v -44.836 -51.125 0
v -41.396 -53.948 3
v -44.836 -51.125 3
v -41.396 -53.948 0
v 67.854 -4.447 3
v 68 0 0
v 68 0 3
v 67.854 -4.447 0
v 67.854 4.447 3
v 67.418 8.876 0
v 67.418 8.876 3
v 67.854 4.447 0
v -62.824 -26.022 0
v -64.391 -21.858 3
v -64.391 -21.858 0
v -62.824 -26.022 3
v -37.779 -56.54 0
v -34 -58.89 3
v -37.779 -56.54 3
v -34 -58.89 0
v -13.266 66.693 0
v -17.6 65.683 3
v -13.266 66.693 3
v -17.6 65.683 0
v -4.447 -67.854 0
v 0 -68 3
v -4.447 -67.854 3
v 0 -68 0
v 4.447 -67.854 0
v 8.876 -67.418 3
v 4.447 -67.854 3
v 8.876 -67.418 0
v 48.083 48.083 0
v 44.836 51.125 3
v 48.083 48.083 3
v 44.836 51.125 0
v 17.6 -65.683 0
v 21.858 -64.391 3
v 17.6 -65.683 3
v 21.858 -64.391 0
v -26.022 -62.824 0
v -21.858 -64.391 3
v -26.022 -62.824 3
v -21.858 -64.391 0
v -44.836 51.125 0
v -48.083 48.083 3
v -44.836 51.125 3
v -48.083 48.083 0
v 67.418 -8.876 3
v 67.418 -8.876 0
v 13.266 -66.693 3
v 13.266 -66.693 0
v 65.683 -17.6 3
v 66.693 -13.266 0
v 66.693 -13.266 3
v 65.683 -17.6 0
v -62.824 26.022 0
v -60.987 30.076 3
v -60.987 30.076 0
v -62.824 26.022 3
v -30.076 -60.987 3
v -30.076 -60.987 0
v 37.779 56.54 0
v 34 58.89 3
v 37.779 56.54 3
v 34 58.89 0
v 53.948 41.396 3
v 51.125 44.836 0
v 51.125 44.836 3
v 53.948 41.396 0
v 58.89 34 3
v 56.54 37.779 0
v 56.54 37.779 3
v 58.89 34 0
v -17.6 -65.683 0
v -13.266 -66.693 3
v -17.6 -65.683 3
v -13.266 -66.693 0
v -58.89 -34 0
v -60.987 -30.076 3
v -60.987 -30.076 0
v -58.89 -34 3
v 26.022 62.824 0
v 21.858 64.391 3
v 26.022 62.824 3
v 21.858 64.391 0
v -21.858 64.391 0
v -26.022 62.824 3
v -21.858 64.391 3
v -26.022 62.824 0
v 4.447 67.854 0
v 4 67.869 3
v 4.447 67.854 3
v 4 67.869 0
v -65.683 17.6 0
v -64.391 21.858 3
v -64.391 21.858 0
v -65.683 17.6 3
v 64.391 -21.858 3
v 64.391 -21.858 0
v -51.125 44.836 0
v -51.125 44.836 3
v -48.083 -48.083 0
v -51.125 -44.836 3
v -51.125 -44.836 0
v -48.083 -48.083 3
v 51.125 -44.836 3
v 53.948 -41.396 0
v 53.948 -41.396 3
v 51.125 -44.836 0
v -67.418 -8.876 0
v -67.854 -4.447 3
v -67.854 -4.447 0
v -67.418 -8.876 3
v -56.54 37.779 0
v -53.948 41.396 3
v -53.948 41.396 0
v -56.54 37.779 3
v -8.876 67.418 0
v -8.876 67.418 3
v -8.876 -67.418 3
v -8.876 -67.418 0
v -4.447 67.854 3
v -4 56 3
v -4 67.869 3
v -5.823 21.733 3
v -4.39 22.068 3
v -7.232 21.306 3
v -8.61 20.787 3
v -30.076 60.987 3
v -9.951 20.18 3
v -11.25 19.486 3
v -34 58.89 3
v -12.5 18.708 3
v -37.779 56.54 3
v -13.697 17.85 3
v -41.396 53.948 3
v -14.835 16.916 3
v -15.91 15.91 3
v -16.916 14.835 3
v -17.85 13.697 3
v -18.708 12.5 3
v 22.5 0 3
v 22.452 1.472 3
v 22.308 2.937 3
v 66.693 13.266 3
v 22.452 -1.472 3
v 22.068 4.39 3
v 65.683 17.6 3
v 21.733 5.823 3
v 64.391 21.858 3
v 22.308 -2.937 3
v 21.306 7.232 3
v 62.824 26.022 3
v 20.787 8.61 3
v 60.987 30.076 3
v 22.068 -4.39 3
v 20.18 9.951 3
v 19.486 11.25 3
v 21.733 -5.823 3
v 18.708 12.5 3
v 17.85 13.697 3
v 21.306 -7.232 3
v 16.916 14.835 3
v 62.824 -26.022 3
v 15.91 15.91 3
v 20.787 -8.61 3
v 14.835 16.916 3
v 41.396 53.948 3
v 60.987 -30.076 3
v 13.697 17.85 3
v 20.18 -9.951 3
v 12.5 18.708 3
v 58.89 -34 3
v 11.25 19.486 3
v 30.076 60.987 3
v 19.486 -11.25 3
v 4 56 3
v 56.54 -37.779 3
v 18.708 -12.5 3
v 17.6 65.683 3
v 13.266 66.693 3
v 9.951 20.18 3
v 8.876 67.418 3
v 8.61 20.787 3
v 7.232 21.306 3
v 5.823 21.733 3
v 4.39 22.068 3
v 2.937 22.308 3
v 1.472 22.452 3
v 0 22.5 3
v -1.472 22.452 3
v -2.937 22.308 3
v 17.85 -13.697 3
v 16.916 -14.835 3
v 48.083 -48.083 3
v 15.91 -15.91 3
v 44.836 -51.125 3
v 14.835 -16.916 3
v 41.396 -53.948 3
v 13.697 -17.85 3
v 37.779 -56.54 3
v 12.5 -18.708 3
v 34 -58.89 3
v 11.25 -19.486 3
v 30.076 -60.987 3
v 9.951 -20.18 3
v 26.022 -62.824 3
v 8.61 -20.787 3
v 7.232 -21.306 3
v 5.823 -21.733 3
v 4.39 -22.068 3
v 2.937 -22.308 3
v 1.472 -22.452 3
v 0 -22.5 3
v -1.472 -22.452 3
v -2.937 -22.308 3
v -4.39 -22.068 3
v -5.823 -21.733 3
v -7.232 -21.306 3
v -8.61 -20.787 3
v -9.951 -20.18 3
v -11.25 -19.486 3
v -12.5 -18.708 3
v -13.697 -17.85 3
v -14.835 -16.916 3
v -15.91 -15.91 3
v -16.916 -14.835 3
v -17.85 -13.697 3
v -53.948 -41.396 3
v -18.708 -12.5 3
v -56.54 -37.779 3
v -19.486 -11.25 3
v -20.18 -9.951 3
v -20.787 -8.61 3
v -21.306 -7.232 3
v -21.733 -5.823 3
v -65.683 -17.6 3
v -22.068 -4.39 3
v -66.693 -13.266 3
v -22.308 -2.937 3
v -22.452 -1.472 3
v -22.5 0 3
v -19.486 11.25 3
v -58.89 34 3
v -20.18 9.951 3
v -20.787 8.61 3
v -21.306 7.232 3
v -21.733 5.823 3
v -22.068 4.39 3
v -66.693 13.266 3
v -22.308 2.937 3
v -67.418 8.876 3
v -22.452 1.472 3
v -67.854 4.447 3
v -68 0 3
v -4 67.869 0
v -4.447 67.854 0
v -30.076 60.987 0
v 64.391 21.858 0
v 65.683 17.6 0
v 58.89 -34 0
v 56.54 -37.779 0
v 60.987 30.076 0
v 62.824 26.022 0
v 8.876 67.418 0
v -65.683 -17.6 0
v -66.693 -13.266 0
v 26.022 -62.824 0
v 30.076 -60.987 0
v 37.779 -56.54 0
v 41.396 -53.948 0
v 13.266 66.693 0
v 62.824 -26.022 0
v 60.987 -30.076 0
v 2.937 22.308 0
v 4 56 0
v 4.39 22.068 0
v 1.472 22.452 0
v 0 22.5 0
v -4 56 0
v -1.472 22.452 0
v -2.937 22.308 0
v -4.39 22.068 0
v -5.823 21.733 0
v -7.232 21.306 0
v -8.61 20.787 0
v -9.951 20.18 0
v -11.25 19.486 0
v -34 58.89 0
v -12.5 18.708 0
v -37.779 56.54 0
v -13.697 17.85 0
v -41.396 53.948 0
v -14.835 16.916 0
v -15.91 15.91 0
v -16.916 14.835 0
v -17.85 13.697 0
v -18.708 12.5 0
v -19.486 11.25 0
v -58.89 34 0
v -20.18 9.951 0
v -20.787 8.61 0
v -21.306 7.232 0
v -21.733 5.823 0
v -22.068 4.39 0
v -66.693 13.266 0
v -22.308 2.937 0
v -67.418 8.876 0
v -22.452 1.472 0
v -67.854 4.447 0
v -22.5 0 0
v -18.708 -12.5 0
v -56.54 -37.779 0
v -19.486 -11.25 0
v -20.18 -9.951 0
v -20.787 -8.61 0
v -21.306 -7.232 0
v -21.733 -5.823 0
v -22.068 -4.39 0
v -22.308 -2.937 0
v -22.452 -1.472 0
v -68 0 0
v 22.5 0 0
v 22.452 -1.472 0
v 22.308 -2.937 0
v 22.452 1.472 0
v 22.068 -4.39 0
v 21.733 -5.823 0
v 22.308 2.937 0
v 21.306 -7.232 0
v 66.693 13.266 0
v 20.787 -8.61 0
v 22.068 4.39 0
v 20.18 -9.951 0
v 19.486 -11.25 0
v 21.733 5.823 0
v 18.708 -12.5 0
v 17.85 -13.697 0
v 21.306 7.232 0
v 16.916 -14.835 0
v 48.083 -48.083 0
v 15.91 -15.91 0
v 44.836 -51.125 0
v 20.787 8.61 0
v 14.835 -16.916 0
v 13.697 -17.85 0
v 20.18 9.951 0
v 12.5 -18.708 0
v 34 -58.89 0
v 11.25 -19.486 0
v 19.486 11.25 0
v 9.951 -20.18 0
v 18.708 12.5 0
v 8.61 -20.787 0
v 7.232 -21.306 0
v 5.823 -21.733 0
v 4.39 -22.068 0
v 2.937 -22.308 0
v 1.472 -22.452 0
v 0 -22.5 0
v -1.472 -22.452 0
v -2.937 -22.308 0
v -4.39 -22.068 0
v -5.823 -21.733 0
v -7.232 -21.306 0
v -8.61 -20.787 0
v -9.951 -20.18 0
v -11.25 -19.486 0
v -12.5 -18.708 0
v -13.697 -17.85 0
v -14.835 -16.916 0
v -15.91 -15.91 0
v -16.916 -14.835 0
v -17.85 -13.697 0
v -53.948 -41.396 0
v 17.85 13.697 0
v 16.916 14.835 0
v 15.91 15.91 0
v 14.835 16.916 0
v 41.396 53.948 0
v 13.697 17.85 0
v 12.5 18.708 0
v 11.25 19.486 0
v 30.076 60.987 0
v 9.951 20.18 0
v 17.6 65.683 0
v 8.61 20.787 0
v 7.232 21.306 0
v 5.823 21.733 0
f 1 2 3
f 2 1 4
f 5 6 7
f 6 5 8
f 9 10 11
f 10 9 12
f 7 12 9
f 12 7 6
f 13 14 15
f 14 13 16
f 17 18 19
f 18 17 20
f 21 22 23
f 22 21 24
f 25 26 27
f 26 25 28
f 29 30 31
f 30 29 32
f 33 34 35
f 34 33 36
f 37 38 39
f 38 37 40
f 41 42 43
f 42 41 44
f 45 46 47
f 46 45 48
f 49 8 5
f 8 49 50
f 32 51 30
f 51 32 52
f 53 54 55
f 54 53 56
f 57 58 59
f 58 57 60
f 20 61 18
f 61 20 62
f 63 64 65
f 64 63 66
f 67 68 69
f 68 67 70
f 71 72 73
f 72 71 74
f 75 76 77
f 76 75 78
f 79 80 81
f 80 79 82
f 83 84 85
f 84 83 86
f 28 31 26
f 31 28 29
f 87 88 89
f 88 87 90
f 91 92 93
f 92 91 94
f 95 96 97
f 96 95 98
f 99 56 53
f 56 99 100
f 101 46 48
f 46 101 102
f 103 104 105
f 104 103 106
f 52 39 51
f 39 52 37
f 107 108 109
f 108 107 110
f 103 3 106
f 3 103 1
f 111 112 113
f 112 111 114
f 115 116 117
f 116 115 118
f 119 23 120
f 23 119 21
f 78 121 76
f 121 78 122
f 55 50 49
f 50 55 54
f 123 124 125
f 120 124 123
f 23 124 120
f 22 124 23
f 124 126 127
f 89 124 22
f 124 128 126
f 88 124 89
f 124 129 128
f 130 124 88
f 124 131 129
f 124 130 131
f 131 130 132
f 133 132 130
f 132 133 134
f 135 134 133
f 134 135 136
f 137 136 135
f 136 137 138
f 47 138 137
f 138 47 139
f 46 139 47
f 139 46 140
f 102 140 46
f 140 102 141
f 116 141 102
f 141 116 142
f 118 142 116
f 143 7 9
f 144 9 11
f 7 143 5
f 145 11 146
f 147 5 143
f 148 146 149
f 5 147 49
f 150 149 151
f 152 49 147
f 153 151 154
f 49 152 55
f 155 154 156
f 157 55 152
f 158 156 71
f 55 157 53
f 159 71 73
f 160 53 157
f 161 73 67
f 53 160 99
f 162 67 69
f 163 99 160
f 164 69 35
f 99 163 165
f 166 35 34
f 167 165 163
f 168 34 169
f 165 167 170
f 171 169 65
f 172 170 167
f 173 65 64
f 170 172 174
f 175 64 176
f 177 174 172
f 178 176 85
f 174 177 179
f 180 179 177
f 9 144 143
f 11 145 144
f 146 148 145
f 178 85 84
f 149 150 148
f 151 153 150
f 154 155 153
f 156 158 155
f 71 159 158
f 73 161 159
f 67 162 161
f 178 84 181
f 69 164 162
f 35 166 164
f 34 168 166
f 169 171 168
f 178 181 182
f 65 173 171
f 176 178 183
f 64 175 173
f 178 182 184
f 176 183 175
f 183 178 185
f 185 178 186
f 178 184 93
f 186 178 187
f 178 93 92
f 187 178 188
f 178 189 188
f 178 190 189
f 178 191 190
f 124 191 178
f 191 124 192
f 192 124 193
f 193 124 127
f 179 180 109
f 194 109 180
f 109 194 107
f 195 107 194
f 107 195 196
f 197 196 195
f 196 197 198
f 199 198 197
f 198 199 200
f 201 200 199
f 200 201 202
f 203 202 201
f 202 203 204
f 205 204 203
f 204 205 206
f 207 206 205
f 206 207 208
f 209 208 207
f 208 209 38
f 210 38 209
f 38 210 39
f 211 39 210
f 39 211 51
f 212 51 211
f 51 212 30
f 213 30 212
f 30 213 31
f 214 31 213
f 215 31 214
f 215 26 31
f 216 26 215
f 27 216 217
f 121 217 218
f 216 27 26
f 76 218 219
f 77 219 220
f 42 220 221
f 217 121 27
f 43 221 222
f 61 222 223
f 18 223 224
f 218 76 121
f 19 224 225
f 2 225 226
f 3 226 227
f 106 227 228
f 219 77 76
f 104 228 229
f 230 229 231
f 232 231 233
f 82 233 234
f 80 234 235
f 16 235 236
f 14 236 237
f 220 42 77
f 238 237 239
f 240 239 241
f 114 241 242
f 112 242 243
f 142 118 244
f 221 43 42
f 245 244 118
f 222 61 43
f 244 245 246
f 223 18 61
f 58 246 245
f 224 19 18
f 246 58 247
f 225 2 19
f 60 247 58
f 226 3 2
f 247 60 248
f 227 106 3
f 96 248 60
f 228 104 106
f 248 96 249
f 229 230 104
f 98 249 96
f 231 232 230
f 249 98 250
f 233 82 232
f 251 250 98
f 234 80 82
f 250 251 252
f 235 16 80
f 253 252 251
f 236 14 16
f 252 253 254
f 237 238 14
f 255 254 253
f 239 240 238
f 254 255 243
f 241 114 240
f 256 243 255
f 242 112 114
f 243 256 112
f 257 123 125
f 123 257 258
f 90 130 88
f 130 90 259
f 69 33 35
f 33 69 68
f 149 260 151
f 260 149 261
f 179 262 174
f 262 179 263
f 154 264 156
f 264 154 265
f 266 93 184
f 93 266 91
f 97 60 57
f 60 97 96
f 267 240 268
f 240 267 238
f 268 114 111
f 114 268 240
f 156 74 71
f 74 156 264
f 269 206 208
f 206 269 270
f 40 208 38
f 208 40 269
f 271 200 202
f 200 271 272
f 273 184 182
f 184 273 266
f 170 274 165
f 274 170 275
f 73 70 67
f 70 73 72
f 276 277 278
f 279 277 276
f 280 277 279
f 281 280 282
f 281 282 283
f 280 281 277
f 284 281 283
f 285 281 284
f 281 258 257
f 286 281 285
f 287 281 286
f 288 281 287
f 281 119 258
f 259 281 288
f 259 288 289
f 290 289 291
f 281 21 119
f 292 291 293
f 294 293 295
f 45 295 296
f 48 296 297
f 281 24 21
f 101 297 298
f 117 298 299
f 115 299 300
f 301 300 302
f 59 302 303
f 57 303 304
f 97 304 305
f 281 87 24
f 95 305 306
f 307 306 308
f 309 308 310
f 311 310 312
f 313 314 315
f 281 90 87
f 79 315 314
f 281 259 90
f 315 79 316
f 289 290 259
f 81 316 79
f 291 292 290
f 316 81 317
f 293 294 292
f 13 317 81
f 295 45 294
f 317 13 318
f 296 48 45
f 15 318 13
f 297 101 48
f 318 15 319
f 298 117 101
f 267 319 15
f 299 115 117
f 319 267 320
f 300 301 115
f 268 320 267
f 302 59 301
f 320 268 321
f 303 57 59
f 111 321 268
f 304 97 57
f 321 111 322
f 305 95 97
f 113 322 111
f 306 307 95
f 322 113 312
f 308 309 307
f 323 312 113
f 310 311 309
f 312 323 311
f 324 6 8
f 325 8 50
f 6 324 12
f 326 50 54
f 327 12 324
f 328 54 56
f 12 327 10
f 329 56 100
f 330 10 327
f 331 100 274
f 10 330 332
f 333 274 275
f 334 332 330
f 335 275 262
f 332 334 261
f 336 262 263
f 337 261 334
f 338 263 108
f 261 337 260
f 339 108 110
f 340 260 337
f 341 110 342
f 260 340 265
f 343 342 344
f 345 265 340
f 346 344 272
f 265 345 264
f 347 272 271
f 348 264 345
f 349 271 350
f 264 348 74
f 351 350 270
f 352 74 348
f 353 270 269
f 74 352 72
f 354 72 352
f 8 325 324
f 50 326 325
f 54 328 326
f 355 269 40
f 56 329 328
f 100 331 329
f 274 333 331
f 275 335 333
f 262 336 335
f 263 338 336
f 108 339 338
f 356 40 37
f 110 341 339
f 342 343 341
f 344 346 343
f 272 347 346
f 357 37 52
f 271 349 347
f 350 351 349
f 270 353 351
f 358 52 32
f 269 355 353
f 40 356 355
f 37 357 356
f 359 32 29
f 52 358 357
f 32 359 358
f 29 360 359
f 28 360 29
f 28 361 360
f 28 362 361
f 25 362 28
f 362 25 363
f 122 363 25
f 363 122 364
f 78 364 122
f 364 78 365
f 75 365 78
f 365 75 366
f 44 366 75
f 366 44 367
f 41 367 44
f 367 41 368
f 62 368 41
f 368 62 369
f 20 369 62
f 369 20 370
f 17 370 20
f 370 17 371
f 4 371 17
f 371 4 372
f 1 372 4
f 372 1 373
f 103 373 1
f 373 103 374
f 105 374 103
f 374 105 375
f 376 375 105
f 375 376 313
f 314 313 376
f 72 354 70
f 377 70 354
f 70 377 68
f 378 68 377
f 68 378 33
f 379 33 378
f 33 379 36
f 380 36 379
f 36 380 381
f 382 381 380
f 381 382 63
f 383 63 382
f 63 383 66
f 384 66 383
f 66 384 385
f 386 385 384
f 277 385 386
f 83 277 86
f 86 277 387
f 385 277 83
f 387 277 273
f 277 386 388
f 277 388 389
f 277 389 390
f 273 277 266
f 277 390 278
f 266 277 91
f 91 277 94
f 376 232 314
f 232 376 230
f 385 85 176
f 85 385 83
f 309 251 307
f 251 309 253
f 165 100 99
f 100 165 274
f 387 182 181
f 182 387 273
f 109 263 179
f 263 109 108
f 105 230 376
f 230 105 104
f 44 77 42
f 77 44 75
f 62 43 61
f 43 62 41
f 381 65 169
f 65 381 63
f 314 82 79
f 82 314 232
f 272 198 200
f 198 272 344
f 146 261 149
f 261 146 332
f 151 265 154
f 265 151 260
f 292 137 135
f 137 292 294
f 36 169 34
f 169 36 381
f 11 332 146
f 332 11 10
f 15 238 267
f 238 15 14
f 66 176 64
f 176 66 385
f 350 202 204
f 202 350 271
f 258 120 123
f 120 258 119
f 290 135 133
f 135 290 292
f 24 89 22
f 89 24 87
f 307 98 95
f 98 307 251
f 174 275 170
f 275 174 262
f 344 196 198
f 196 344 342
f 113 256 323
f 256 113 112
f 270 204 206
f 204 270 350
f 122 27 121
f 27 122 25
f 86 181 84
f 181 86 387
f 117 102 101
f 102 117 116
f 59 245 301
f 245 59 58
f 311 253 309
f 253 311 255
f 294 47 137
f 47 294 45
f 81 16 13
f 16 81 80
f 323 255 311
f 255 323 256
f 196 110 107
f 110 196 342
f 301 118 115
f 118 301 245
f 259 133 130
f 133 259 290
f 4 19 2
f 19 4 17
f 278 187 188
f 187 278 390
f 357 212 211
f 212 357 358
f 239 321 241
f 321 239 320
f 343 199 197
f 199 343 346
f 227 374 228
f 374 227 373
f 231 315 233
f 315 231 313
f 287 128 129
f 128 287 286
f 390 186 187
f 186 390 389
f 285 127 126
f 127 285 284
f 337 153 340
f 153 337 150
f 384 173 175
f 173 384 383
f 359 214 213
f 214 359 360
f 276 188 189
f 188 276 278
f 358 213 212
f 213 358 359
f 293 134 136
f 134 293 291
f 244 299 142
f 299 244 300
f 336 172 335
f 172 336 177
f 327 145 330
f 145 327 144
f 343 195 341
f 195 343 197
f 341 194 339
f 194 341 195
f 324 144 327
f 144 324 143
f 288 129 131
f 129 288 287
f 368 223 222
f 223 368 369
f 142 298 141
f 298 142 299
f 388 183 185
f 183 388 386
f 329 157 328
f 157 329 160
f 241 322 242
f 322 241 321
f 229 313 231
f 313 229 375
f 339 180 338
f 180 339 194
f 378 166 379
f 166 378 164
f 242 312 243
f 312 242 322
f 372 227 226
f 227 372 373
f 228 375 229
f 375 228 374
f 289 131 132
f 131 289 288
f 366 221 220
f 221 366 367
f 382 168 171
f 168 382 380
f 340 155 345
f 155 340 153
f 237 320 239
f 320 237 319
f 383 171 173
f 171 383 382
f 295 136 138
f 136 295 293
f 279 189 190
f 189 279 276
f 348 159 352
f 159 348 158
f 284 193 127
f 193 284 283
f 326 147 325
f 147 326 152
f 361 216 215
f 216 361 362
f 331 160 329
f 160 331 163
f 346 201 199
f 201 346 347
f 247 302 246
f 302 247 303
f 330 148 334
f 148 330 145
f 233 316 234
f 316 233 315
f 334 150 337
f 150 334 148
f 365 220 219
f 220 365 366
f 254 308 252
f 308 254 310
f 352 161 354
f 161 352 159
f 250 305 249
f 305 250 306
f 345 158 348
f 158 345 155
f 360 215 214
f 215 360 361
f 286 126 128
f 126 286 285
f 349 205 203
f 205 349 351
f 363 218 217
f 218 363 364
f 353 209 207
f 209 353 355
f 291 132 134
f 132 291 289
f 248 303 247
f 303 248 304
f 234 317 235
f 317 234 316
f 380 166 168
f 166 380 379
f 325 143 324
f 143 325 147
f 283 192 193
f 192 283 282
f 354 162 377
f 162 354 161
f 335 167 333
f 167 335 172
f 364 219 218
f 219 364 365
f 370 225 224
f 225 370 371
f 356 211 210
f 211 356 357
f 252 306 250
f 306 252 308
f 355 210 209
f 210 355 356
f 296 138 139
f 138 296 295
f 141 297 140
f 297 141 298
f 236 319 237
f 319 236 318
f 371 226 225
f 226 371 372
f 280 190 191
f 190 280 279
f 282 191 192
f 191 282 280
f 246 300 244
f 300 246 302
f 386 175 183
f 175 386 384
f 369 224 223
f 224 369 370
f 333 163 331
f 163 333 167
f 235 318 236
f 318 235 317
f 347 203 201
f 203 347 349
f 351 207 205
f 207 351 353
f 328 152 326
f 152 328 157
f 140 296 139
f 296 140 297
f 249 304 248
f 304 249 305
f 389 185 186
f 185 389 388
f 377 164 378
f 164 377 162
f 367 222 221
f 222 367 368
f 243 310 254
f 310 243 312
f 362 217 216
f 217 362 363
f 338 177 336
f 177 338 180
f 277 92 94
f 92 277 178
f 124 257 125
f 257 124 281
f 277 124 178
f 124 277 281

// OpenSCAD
// file: params.scad
// ============================================================================
//  Smart Grow Topf — zentrale Parameter
//  Alle Maße in mm. Verbindliche Werte: docs/02_architektur-und-geometrie.md
//  Hier aendern, nichts in den Bauteilen hart verdrahten.
// ============================================================================

// ---- Render-Qualitaet -------------------------------------------------------
$fn = 96;          // Zylinder-/Rotationsaufloesung (Druck: 96 genuegt)

// ---- Grundkoerper -----------------------------------------------------------
shell_od    = 140.0;                 // Aussen-Durchmesser Topf
wall        = 3.0;                   // Wandstaerke
shell_or    = shell_od / 2;          // 70.0
shell_ir    = shell_or - wall;       // 67.0  Innen-Durchmesser = 134
total_h     = 278.0;                 // Gesamthoehe ohne Pflanze
floor_t     = 3.0;                   // Bodenstaerke Tank

// ---- Wassertank -------------------------------------------------------------
tank_h      = 82.0;                  // Innenhoehe bis Rostauflage
max_water   = 71.0;                  // max. Wasserstand (1,0 L)

// ---- Auflagerost / Trennplatte ---------------------------------------------
grid_t      = 4.0;                   // Dicke
grid_od     = 132.0;                 // Aussen-Durchmesser
grid_or     = grid_od / 2;           // 66.0
grid_z0     = tank_h;                // 82.0
grid_z1     = grid_z0 + grid_t;      // 86.0
grid_hole_d = 4.0;                   // Lochung (haelt Blahton zurueck)
grid_pitch  = 9.0;
grid_rim    = 4.0;                   // ungelochter Rand
ledge_ir    = 60.0;                  // Auflagering innen (Tankseite)
ledge_h     = 3.0;
ledge_z1    = grid_z0;               // 82.0
ledge_z0    = ledge_z1 - ledge_h;    // 79.0

// ---- Luftspalt / Innentopf --------------------------------------------------
air_gap     = 30.0;                  // 86 -> 116 ueber max. Wasserstand
pot_z0      = grid_z1 + air_gap;     // 116.0
pot_h       = 150.0;                 // Erdbehaelterhoehe
pot_od      = 132.0;
pot_or      = pot_od / 2;            // 66.0
pot_wall    = 2.5;
pot_ir      = pot_or - pot_wall;     // 63.5
pot_floor_t = 3.0;
pot_z1      = pot_z0 + pot_h;        // 266.0
foot_h      = air_gap;               // Giessfuesse
n_feet      = 6;
foot_r      = 58.0;                  // Fussradius
foot_w      = 12.0;                  // tangentiale Fussbreite
foot_d      = 8.0;                   // radiale Fusstiefe
drain_hole_d = 4.0;
drain_pitch  = 10.0;

// ---- Kragen / Ringauflage ---------------------------------------------------
collar_z0   = pot_z1;                // 266.0
collar_z1   = total_h;               // 278.0
collar_h    = collar_z1 - collar_z0;// 12.0
collar_r    = shell_or + 2.0;        // 72.0 Ausstellungsradius

// ---- Wulst (Elektronik + Kanaele) -------------------------------------------
wulst_z0      = 90.0;
wulst_h       = 160.0;
wulst_z1      = wulst_z0 + wulst_h;  // 250.0
wulst_w       = 60.0;                // tangential (X)
wulst_d       = 40.0;                // radial, ab Mantel
wulst_y_outer = shell_or + wulst_d;  // 110.0
wulst_cr      = 8.0;                 // Eckradius (vertikal)
wulst_wall    = 6.0;                 // Wandstaerke Wulst
wulst_taper   = 40.0;                // 45-Grad-Bodenfase (stuetztragfrei)

// Innenraum (Elektronikkammer)
wc_x   = 20.0;                       // halbe Breite
wc_y0  = 72.0;                       // innen (hinter der Mantelwand)
wc_y1  = wulst_y_outer + 2.0;        // vorne (durch Deckeloeffnung)
wc_z0  = wulst_z0 + 2.0;             // 92.0
wc_z1  = wulst_z1 - wulst_wall;      // 244.0

// Kanaele
cable_d  = 4.5;                      // Sensorkabel
cable_z  = 246.0;
hose_w   = 6.0;                      // Schlauchkanal
hose_z   = 100.0;
pressure_hole_d = 6.5;               // Druckschlauch nach oben
pressure_x = 14.0;
pressure_y = 98.0;

// Deckel-Verschraubung (Innengewinde-Platzhalter fuer M2.5)
boss_d    = 7.0;
boss_hole_d = 2.4;
boss_x    = 17.0;
boss_z    = [100.0, 234.0];

// Tropfkante Wulstboden
drip_band = 1.6;                     // radiale Ueberlappung
drip_h    = 1.6;
drip_z    = wulst_z0 + wulst_taper - 1.0;  // 129.0

// ---- Bauteil-Footprints (Elektronik) ---------------------------------------
xiao_w   = 21.0;                     // XIAO ESP32-C6
xiao_l   = 17.5;
pcb_l    = 52.0;                     // Eigenbau-PCB
pcb_w    = 42.0;
pcb_t    = 1.6;
batt_l   = 59.0;                     // EFASO 503759
batt_w   = 37.0;
batt_t   = 5.0;
pump_d   = 27.8;                     // Adafruit 3910
pump_l   = 66.8;
pump_mount_d = 3.7;                  // Montagebohrungen
pump_mount_cc = 50.0;                // Lochabstand
usb_w    = 9.5;                      // USB-C Durchbruch
usb_h    = 3.6;
led_d    = 5.0;

// ---- Verteilerring ----------------------------------------------------------
ring_od       = 105.0;               // <= 105
ring_or       = ring_od / 2;         // 52.5
ring_ir       = 38.0;                // innere Oeffnung
ring_h        = 16.0;
ring_wall     = 2.2;
ring_holes    = 10;                  // 8..12
ring_hole_d   = 2.6;
ring_hole_r   = ring_ir + 5.0;       // Bohrkreis (innen/ unten)
ring_barb_len = 12.0;
ring_barb_od  = 5.6;
ring_barb_id  = 3.8;

// ---- Abdeckung (optional) ---------------------------------------------------
cover_od   = 136.0;
cover_t    = 3.0;
cover_hole = 45.0;

// ---- Segmentierung (Bauraum 220 x 220 x 250) --------------------------------
split_z    = wulst_z0;               // 90.0  Trennebene unten/oben
spigot_h   = 6.0;                    // Steckzapfen
spigot_or  = shell_or - 2.0;         // 68.0
socket_ir  = spigot_or + 0.6;        // 68.6 Einsteck-Spiel
// main file
// Optionale Substrat-Abdeckung — Druckteil
include <modules.scad>
cover();
